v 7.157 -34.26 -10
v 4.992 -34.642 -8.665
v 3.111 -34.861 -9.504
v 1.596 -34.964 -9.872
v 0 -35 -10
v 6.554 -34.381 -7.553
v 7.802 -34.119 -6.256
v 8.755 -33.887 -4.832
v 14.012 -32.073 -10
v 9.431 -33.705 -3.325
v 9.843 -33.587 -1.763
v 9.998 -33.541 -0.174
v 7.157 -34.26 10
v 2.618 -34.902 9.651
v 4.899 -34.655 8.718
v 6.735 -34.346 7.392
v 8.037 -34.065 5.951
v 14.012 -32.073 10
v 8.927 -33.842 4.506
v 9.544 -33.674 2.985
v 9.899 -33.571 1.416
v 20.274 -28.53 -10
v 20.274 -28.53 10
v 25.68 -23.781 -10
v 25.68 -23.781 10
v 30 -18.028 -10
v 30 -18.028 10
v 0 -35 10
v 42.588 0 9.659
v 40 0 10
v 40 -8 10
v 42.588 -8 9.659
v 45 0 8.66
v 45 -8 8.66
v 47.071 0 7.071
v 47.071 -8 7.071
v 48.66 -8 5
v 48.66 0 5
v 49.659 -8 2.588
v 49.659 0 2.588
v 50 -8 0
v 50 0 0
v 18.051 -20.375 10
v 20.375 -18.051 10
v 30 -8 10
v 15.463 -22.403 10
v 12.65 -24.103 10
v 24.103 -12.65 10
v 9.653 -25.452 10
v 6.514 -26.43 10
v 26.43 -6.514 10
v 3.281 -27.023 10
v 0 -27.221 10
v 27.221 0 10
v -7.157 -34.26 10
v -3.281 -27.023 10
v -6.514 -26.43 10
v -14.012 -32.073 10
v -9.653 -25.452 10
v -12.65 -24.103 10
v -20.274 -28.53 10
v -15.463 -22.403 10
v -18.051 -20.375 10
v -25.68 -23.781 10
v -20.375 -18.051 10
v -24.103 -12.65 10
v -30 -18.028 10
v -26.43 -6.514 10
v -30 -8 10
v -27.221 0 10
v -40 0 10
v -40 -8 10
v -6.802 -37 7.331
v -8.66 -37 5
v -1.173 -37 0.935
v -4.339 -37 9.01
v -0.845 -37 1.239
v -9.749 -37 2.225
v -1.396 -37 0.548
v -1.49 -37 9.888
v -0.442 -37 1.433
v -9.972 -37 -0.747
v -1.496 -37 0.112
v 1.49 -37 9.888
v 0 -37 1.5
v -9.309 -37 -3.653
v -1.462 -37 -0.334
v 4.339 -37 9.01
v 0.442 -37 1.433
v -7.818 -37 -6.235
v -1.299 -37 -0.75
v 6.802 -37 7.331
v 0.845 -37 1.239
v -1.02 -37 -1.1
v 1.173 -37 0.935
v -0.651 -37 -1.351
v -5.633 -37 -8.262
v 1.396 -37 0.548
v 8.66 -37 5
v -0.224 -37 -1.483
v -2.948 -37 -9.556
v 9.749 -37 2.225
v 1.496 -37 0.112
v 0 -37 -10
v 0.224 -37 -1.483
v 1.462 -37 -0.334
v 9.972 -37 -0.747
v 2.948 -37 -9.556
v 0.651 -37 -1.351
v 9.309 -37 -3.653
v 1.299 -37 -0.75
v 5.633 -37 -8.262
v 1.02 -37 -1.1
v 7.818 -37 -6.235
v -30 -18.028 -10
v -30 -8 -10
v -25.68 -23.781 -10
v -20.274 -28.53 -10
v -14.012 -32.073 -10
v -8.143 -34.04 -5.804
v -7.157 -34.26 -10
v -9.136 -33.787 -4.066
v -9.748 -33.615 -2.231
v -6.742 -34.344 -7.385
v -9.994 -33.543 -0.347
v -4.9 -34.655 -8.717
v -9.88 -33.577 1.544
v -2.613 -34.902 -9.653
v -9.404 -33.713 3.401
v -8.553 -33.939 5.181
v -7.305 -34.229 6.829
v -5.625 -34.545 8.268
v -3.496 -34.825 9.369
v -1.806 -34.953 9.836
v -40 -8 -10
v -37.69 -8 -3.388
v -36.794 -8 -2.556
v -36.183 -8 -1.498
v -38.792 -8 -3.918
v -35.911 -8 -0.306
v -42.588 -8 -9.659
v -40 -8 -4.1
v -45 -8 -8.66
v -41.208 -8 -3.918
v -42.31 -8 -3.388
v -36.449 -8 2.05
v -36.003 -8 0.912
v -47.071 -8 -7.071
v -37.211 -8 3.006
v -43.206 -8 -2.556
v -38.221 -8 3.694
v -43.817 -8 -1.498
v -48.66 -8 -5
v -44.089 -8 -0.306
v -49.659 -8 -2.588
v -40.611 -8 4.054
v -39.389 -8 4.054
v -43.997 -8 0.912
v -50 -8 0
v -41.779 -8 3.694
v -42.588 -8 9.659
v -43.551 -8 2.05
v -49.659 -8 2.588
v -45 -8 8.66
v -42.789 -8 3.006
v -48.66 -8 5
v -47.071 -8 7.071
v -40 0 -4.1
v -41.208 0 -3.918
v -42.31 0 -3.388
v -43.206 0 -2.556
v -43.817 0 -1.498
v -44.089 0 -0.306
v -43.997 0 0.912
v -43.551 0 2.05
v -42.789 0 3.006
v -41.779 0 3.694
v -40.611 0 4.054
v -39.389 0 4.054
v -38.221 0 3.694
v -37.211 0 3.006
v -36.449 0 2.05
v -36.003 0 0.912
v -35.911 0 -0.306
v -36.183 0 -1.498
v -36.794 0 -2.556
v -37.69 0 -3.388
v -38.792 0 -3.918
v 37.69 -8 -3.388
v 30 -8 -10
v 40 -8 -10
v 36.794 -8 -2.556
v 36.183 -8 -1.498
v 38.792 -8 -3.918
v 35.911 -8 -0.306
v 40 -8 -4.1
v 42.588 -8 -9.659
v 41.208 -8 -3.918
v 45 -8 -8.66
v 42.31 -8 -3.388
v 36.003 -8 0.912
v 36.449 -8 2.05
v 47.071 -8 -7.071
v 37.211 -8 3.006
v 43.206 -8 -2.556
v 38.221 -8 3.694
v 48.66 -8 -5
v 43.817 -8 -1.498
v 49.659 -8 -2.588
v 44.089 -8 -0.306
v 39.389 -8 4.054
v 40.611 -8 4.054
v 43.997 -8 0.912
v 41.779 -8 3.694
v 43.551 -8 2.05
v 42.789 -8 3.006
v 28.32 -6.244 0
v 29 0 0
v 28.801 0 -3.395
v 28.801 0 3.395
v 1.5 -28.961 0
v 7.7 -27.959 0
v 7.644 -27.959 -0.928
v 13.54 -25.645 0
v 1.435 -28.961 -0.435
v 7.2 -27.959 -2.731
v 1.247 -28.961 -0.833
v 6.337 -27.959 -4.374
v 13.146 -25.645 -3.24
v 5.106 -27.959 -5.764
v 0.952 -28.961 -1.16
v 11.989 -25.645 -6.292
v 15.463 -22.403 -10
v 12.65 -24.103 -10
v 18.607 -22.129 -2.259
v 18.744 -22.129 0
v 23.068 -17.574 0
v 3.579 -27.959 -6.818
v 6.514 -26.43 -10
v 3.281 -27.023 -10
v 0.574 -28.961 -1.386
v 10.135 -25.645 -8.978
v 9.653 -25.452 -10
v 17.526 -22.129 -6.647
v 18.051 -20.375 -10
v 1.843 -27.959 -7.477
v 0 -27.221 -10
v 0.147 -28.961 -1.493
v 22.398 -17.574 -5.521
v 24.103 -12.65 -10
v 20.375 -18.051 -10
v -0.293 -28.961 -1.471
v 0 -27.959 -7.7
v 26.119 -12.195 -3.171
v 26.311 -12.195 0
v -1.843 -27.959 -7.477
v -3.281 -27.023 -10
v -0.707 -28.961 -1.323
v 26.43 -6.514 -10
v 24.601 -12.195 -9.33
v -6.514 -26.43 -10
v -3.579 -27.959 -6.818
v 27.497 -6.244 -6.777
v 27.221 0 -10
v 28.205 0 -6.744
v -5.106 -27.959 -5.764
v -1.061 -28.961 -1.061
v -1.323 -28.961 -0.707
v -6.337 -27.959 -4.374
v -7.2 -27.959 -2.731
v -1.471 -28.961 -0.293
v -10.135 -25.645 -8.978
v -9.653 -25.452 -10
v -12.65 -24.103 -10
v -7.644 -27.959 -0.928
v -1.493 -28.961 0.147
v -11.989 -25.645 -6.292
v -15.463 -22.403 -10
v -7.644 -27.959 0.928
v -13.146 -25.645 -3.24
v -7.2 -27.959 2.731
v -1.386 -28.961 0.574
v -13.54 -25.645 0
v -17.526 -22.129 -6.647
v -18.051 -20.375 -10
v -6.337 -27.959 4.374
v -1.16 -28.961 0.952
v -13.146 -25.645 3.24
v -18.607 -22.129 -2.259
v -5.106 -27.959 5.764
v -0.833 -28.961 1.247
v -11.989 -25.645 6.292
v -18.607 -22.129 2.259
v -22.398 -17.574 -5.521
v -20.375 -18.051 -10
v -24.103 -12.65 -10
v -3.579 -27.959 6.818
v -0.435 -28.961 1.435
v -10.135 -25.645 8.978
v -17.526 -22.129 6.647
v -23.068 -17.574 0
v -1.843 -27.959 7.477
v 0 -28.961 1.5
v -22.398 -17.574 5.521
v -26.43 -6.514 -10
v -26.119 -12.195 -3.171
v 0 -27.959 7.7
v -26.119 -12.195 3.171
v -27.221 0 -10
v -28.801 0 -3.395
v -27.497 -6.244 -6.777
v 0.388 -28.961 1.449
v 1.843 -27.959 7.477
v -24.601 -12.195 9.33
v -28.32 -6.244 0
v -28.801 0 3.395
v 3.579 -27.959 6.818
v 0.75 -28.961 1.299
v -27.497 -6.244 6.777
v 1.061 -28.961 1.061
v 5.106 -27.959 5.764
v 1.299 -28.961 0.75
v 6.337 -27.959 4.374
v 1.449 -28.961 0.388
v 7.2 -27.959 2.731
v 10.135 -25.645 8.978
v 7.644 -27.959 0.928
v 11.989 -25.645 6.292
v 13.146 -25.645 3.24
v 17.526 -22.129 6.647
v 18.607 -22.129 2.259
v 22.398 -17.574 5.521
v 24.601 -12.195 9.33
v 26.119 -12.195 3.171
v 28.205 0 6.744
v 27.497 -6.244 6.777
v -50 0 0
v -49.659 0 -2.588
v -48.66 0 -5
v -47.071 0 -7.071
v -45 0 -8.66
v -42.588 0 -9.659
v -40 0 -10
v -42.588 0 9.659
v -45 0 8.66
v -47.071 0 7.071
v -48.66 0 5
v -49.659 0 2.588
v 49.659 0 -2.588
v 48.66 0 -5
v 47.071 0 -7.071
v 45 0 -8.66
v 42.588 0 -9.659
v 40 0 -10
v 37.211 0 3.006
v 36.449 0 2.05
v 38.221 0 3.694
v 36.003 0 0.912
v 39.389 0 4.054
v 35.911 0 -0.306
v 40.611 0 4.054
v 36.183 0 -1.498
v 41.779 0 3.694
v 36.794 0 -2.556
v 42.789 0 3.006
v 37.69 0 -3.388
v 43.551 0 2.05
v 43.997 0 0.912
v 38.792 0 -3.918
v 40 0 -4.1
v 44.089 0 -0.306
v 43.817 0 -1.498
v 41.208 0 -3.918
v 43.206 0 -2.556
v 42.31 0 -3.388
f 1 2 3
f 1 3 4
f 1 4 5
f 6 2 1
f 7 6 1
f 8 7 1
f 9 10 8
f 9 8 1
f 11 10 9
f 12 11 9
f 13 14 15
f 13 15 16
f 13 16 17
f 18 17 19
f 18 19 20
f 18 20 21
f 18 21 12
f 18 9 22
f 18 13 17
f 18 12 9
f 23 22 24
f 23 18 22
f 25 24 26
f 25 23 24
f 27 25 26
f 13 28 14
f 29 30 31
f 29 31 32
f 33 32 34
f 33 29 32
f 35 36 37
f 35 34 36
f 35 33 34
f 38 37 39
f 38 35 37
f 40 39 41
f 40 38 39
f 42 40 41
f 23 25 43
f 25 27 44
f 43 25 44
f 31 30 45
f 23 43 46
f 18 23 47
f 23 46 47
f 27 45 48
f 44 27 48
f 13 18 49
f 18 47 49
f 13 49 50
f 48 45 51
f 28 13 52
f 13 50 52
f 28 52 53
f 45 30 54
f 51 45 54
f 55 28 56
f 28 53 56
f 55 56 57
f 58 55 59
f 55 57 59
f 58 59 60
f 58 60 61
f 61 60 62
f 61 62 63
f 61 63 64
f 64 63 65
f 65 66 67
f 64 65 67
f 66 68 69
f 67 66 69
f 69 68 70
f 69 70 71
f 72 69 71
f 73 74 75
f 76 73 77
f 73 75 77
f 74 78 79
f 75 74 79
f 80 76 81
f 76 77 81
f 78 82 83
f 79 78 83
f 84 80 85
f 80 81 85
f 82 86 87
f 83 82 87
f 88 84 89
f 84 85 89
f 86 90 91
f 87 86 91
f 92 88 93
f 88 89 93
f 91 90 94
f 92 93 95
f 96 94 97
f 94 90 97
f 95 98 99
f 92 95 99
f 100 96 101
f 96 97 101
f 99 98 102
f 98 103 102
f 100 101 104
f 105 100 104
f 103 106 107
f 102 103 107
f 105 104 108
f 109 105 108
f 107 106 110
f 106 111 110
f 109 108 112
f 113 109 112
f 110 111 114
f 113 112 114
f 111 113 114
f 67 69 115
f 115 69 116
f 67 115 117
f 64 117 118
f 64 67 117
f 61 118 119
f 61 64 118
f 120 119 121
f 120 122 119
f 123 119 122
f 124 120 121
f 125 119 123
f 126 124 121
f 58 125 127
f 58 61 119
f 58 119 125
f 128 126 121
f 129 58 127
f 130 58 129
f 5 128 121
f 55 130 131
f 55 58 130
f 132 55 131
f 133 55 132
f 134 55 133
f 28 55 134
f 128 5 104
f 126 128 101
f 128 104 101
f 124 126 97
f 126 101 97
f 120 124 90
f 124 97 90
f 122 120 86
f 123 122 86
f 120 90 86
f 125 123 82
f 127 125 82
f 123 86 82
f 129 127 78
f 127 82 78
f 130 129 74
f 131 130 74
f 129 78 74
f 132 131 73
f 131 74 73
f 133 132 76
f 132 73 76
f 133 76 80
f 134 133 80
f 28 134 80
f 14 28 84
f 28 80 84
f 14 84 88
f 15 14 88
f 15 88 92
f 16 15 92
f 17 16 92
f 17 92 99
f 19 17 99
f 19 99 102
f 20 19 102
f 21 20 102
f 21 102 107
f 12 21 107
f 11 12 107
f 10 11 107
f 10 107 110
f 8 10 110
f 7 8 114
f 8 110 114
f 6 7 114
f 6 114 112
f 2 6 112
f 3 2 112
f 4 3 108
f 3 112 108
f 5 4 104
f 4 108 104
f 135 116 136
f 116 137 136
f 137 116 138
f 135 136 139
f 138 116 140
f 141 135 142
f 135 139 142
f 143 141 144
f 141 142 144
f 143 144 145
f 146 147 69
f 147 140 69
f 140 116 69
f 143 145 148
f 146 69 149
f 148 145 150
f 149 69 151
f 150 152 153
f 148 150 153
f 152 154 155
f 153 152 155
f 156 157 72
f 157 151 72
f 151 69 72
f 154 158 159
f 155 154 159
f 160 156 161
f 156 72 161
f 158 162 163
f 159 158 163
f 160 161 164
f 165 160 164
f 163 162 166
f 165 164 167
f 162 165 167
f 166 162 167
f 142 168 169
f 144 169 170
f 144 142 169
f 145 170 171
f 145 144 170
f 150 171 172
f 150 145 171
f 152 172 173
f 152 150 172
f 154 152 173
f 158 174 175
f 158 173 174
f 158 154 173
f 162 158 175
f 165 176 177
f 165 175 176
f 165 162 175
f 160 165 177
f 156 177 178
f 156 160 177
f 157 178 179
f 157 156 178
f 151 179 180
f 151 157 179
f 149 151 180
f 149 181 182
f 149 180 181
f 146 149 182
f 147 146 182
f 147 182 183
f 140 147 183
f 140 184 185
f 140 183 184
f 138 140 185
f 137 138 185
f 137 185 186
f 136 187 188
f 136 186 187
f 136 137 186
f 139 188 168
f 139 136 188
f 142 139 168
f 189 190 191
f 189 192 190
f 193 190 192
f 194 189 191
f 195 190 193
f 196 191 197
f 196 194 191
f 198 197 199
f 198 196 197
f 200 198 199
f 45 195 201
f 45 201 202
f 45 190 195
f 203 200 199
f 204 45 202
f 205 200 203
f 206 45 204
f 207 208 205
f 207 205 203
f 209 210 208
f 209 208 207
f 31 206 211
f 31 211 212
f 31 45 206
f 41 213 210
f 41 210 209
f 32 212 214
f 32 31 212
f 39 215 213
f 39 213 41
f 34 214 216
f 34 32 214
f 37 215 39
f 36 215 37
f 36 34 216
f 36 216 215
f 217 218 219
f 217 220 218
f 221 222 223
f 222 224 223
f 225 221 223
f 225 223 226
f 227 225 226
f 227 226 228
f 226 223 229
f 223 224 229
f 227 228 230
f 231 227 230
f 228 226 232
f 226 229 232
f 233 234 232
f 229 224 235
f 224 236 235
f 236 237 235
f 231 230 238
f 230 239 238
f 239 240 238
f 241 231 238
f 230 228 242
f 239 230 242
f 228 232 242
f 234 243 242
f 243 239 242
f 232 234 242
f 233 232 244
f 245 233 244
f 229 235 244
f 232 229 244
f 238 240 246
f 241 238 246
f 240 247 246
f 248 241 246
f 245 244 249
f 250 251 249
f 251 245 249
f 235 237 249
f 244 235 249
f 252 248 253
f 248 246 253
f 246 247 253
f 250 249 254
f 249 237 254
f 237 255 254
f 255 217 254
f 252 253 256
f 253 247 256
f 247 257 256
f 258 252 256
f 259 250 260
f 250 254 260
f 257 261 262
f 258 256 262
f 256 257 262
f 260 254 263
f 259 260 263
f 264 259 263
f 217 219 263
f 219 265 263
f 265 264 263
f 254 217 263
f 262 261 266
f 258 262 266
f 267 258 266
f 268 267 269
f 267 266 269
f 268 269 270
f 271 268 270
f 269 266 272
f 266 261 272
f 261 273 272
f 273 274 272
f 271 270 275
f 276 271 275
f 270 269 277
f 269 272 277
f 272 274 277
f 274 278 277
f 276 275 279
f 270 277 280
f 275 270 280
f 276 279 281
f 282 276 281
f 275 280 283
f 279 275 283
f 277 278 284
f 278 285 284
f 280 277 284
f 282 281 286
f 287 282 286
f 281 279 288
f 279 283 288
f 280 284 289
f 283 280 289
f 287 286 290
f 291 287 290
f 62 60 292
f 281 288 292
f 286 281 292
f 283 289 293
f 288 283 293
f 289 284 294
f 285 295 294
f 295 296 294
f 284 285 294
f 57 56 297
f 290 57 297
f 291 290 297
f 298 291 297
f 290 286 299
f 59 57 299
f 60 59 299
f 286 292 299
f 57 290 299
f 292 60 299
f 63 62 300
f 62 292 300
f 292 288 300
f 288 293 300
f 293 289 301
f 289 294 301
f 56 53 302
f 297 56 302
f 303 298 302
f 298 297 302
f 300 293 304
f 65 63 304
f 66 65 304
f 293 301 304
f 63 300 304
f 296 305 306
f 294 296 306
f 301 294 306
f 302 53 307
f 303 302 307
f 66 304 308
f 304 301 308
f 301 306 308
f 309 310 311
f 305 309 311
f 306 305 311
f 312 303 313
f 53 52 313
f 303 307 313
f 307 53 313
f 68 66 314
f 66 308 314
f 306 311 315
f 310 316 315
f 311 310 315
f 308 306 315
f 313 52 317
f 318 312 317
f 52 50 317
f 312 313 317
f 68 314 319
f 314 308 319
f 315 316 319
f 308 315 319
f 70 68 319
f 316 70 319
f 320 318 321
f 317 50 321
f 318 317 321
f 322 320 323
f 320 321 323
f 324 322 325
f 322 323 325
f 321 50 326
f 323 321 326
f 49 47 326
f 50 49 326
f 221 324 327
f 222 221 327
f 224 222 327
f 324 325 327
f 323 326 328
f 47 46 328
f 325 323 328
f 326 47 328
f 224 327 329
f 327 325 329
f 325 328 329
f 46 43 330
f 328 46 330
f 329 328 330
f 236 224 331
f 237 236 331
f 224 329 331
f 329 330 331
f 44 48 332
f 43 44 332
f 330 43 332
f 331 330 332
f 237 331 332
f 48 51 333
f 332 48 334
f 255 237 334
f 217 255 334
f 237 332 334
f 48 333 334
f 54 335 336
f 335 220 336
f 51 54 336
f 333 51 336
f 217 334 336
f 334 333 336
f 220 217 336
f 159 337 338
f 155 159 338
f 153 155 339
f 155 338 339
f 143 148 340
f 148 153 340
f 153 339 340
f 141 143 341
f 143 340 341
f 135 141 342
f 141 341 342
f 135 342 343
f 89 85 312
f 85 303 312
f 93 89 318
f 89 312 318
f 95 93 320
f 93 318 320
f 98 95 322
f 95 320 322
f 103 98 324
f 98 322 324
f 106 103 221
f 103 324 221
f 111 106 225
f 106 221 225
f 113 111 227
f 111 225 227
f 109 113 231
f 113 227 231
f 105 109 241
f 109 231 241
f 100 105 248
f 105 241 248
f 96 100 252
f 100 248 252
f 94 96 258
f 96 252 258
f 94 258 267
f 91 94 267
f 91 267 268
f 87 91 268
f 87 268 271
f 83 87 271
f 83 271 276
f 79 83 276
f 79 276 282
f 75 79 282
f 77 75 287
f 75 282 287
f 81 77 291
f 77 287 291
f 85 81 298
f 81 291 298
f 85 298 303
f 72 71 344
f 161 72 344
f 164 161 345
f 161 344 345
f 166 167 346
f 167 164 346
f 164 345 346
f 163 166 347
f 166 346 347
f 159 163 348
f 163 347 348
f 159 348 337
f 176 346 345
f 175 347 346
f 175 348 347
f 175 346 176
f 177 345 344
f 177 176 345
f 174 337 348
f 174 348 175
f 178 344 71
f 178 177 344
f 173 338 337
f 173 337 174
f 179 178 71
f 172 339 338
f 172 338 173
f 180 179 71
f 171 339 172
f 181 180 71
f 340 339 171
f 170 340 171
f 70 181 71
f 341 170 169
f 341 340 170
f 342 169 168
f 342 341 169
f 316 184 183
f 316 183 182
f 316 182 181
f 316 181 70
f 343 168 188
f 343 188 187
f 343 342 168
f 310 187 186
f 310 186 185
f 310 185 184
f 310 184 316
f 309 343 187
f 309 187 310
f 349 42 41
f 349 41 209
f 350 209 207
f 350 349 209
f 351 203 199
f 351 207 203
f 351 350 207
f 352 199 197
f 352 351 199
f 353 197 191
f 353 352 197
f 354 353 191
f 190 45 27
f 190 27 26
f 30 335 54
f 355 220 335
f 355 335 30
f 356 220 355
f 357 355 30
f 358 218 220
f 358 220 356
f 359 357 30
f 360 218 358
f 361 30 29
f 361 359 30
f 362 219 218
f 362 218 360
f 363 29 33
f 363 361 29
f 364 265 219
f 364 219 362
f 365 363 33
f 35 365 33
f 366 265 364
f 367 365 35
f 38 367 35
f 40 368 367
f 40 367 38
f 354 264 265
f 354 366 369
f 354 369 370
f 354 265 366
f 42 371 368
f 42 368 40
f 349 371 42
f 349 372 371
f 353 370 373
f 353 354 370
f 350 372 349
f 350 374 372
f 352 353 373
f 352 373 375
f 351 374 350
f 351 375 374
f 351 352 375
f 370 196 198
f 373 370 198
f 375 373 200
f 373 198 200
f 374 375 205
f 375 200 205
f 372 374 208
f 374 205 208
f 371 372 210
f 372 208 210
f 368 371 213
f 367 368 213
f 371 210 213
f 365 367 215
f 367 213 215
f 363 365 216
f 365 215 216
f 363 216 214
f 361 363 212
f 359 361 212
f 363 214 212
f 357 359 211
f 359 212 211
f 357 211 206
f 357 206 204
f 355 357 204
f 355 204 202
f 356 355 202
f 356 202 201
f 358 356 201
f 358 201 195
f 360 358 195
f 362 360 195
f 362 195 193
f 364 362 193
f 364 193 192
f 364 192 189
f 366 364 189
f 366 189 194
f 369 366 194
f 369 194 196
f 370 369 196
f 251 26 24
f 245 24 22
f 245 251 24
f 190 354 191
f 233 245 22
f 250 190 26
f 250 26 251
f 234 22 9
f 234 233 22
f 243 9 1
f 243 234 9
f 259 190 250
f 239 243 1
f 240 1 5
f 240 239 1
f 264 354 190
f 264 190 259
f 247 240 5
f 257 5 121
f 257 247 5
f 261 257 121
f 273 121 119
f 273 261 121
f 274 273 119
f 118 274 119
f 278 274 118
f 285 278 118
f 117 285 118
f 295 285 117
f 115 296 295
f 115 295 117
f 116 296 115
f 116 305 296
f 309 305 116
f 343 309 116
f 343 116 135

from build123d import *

# Parameters (mm, degrees)
EXTRUDE_2_DEPTH      = 19
EXTRUDE_3_DEPTH      = 40
CUT_EXTRUDE_START    = -32
CUT_EXTRUDE_1_DEPTH  = 32
SKETCH_4_R           = 4.1
CUT_EXTRUDE_2_DEPTH  = 60.916608716
EXTRUDE_4_REACH      = 102.922
EXTRUDE_4_END_RADIUS = 35
EXTRUDE_START        = -37
SKETCH_5_R           = 10
SKETCH_5_R_2         = 1.5
SKETCH_5_4_R         = 1.5
CUT_EXTRUDE_3_DEPTH  = 66.038450252
CUT_EXTRUDE_4_DEPTH  = 12
SKETCH_6_R           = 4
CUT_EXTRUDE_5_DEPTH  = 30
SKETCH_10_W          = 80
SKETCH_10_H          = 68
CUT_EXTRUDE_6_DEPTH  = 76.617458351
SKETCH_11_W          = 80
SKETCH_11_H          = 20
CUT_EXTRUDE_7_DEPTH  = 69.629439801
SKETCH_12_W          = 10
SKETCH_12_H          = 20
CUT_EXTRUDE_8_DEPTH  = 59.660037571
SKETCH_13_W          = 10
SKETCH_13_H          = 20
CUT_EXTRUDE_9_DEPTH  = 59.660037571
SKETCH_14_R          = 1.5
CUT_EXTRUDE_10_DEPTH = 64.000000016


with BuildPart() as part:
    # Эскиз1 → Бобышка-Вытянуть2 (new, symmetric)
    with BuildSketch(Plane.XY):
        with BuildLine():
            Line((35, 0), (26, 0))
            ThreePointArc((26, 0), (0, -26), (-26, 0))
            Line((-26, 0), (-35, 0))
            ThreePointArc((-35, 0), (0, -35), (35, 0))
        make_face()
        with BuildLine():
            Line((26, 0), (24, 0))
            ThreePointArc((24, 0), (0, -24), (-24, 0))
            Line((-24, 0), (-26, 0))
            ThreePointArc((-26, 0), (0, -26), (26, 0))
        make_face()
    extrude(amount=EXTRUDE_2_DEPTH, both=True)

    # Эскиз2 → Бобышка-Вытянуть3 (add)
    with BuildSketch(Plane(origin=(0, 0, 0), x_dir=(1, 0, 0), z_dir=(0, 1, 0))):
        with BuildLine():
            ThreePointArc((50, 0), (47.071067812, 7.071067812), (40, 10))
            ThreePointArc((40, 10), (37.411809549, 9.659258263), (35, 8.660254038))
            Line((35, 8.660254038), (35, -8.660254038))
            ThreePointArc((35, -8.660254038), (37.411809549, -9.659258263), (40, -10))
            ThreePointArc((40, -10), (47.071067812, -7.071067812), (50, 0))
        make_face()
        with BuildLine():
            Line((35, -8.660254038), (35, 8.660254038))
            ThreePointArc((35, 8.660254038), (31.339745962, 5), (30, 0))
            ThreePointArc((30, 0), (31.339745962, -5), (35, -8.660254038))
        make_face()
        with BuildLine():
            ThreePointArc((35, 8.660254038), (37.411809549, 9.659258263), (40, 10))
            Line((40, 10), (35, 10))
            Line((35, 10), (35, 8.660254038))
        make_face()
        with BuildLine():
            Line((35, -10), (40, -10))
            ThreePointArc((40, -10), (37.411809549, -9.659258263), (35, -8.660254038))
            Line((35, -8.660254038), (35, -10))
        make_face()
        with BuildLine():
            Line((35, 8.660254038), (35, 10))
            Line((35, 10), (30, 10))
            Line((30, 10), (30, 0))
            ThreePointArc((30, 0), (31.339745962, 5), (35, 8.660254038))
        make_face()
        with BuildLine():
            ThreePointArc((35, -8.660254038), (31.339745962, -5), (30, 0))
            Line((30, 0), (30, -10))
            Line((30, -10), (35, -10))
            Line((35, -10), (35, -8.660254038))
        make_face()
    extrude_3 = extrude(amount=-EXTRUDE_3_DEPTH)

    # Эскиз3 → Вырез-Вытянуть1 (cut)
    with BuildSketch(Plane.XZ.offset(40).offset(CUT_EXTRUDE_START)):
        with BuildLine():
            Line((40, 10), (30, 10))
            Line((30, 10), (30, -10))
            Line((30, -10), (40, -10))
            ThreePointArc((40, -10), (50, 0), (40, 10))
        make_face()
    cut_extrude_1 = extrude(amount=CUT_EXTRUDE_1_DEPTH, mode=Mode.SUBTRACT)

    # Эскиз4 → Вырез-Вытянуть2 (cut, through all)
    with BuildSketch(Plane.XZ.offset(8)):
        with Locations(Location((40, 0, 0), (0, 0, 270))):
            Circle(SKETCH_4_R)
    cut_extrude_2 = extrude(amount=-CUT_EXTRUDE_2_DEPTH, mode=Mode.SUBTRACT)

    # Зеркальное отражение1: Бобышка-Вытянуть3, Вырез-Вытянуть1, Вырез-Вытянуть2 across plane
    add(extrude_3.mirror(Plane(origin=(0, 0, 0), x_dir=(0, 0, 1), z_dir=(1, 0, 0))))
    add(cut_extrude_1.mirror(Plane(origin=(0, 0, 0), x_dir=(0, 0, 1), z_dir=(1, 0, 0))), mode=Mode.SUBTRACT)
    add(cut_extrude_2.mirror(Plane(origin=(0, 0, 0), x_dir=(0, 0, 1), z_dir=(1, 0, 0))), mode=Mode.SUBTRACT)

    # Бобышка-Вытянуть4: up to this cylinder (the profile starts outside it)
    extrude_4_end = Plane(origin=(0, 0, 4.8585785), z_dir=(0, 0, -1)) * Cylinder(EXTRUDE_4_END_RADIUS, 286.561157, mode=Mode.PRIVATE)
    # Эскиз5 → Бобышка-Вытянуть4 (add, up to the surface)
    with BuildSketch(Plane(origin=(0, 0, 0), x_dir=(1, 0, 0), z_dir=(0, 1, 0)).offset(EXTRUDE_START), mode=Mode.PRIVATE) as extrude_4_sk1:
        with Locations(Location((0, 0, 0), (0, 0, 90))):
            Circle(SKETCH_5_R)
        Circle(SKETCH_5_R_2, mode=Mode.SUBTRACT)
    extrude_4_tool1 = extrude(extrude_4_sk1.sketch, amount=EXTRUDE_4_REACH, mode=Mode.PRIVATE) - extrude_4_end
    add(extrude_4_tool1.solids().sort_by_distance((0, -37, 9.717157))[0])
    # Эскиз5 → Бобышка-Вытянуть4 (add, up to the surface)
    with BuildSketch(Plane(origin=(0, 0, 0), x_dir=(1, 0, 0), z_dir=(0, 1, 0)).offset(EXTRUDE_START), mode=Mode.PRIVATE) as extrude_4_sk2:
        Circle(SKETCH_5_R_2)
    extrude_4_tool2 = extrude(extrude_4_sk2.sketch, amount=EXTRUDE_4_REACH, mode=Mode.PRIVATE) - extrude_4_end
    add(extrude_4_tool2.solids().sort_by_distance((0, -37, 0))[0])

    # Эскиз5<4> → Вырез-Вытянуть3 (cut, through all)
    with BuildSketch(Plane(origin=(0, 0, 0), x_dir=(1, 0, 0), z_dir=(0, 1, 0))):
        with Locations(Location((0, 0, 0), (0, 0, 270))):
            Circle(SKETCH_5_4_R)
    extrude(amount=-CUT_EXTRUDE_3_DEPTH, mode=Mode.SUBTRACT)

    # Эскиз1<4> → Вырез-Вытянуть4 (cut, symmetric)
    with BuildSketch(Plane.XY):
        with BuildLine():
            ThreePointArc((-24, 0), (0, 24), (24, 0))
            Line((24, 0), (26, 0))
            ThreePointArc((26, 0), (0, 26), (-26, 0))
            Line((-26, 0), (-24, 0))
        make_face()
        with BuildLine():
            Line((26, 0), (24, 0))
            ThreePointArc((24, 0), (0, -24), (-24, 0))
            Line((-24, 0), (-26, 0))
            ThreePointArc((-26, 0), (0, -26), (26, 0))
        make_face()
    extrude(amount=CUT_EXTRUDE_4_DEPTH, both=True, mode=Mode.SUBTRACT)

    # Эскиз6 → Вырез-Вытянуть5 (cut)
    with BuildSketch(Plane(origin=(0, 0, 0), x_dir=(1, 0, 0), z_dir=(0, 1, 0))):
        with Locations(Location((0, 0, 0), (0, 0, 270))):
            Circle(SKETCH_6_R)
    extrude(amount=-CUT_EXTRUDE_5_DEPTH, mode=Mode.SUBTRACT)

    # Эскиз7 → Повернуть1 (revolve)
    with BuildSketch(Plane.XY):
        with BuildLine():
            Line((0, 33), (0, -33))
            ThreePointArc((0, -33), (33, 0), (0, 33))
        make_face()
    revolve(axis=Axis((0, 0, 0), (0, 1, 0)))

    # Эскиз8 → Вырез-Повернуть1 (revolve, cut)
    with BuildSketch(Plane.XY):
        with BuildLine():
            Line((0, 29), (0, -29))
            ThreePointArc((0, -29), (29, 0), (0, 29))
        make_face()
    revolve(axis=Axis((0, 0, 0), (0, 1, 0)), mode=Mode.SUBTRACT)

    # Эскиз10 → Вырез-Вытянуть6 (cut, through all)
    with BuildSketch(Plane(origin=(0, 0, -10), x_dir=(-1, 0, 0), z_dir=(0, 0, -1))):
        with Locations((0, -1)):
            Rectangle(SKETCH_10_W, SKETCH_10_H)
    cut_extrude_6 = extrude(amount=CUT_EXTRUDE_6_DEPTH, mode=Mode.SUBTRACT)

    # Зеркальное отражение2: Вырез-Вытянуть6 across plane
    add(cut_extrude_6.mirror(Plane.XY), mode=Mode.SUBTRACT)

    # Эскиз11 → Вырез-Вытянуть7 (cut, through all)
    with BuildSketch(Plane(origin=(0, 0, 0), x_dir=(1, 0, 0), z_dir=(0, 1, 0))):
        Rectangle(SKETCH_11_W, SKETCH_11_H)
    extrude(amount=CUT_EXTRUDE_7_DEPTH, mode=Mode.SUBTRACT)

    # Эскиз12 → Вырез-Вытянуть8 (cut, through all)
    with BuildSketch(Plane.XZ.offset(8)):
        with Locations((-35, 0)):
            Rectangle(SKETCH_12_W, SKETCH_12_H)
    extrude(amount=CUT_EXTRUDE_8_DEPTH, mode=Mode.SUBTRACT)

    # Эскиз13 → Вырез-Вытянуть9 (cut, through all)
    with BuildSketch(Plane.XZ.offset(8)):
        with Locations((35, 0)):
            Rectangle(SKETCH_13_W, SKETCH_13_H)
    extrude(amount=CUT_EXTRUDE_9_DEPTH, mode=Mode.SUBTRACT)

    # Эскиз14 → Вырез-Вытянуть10 (cut, through all)
    with BuildSketch(Plane.XZ.offset(37)):
        with Locations(Location((0, 0, 0), (0, 0, 90))):
            Circle(SKETCH_14_R)
    extrude(amount=-CUT_EXTRUDE_10_DEPTH, mode=Mode.SUBTRACT)


solid = part.part
